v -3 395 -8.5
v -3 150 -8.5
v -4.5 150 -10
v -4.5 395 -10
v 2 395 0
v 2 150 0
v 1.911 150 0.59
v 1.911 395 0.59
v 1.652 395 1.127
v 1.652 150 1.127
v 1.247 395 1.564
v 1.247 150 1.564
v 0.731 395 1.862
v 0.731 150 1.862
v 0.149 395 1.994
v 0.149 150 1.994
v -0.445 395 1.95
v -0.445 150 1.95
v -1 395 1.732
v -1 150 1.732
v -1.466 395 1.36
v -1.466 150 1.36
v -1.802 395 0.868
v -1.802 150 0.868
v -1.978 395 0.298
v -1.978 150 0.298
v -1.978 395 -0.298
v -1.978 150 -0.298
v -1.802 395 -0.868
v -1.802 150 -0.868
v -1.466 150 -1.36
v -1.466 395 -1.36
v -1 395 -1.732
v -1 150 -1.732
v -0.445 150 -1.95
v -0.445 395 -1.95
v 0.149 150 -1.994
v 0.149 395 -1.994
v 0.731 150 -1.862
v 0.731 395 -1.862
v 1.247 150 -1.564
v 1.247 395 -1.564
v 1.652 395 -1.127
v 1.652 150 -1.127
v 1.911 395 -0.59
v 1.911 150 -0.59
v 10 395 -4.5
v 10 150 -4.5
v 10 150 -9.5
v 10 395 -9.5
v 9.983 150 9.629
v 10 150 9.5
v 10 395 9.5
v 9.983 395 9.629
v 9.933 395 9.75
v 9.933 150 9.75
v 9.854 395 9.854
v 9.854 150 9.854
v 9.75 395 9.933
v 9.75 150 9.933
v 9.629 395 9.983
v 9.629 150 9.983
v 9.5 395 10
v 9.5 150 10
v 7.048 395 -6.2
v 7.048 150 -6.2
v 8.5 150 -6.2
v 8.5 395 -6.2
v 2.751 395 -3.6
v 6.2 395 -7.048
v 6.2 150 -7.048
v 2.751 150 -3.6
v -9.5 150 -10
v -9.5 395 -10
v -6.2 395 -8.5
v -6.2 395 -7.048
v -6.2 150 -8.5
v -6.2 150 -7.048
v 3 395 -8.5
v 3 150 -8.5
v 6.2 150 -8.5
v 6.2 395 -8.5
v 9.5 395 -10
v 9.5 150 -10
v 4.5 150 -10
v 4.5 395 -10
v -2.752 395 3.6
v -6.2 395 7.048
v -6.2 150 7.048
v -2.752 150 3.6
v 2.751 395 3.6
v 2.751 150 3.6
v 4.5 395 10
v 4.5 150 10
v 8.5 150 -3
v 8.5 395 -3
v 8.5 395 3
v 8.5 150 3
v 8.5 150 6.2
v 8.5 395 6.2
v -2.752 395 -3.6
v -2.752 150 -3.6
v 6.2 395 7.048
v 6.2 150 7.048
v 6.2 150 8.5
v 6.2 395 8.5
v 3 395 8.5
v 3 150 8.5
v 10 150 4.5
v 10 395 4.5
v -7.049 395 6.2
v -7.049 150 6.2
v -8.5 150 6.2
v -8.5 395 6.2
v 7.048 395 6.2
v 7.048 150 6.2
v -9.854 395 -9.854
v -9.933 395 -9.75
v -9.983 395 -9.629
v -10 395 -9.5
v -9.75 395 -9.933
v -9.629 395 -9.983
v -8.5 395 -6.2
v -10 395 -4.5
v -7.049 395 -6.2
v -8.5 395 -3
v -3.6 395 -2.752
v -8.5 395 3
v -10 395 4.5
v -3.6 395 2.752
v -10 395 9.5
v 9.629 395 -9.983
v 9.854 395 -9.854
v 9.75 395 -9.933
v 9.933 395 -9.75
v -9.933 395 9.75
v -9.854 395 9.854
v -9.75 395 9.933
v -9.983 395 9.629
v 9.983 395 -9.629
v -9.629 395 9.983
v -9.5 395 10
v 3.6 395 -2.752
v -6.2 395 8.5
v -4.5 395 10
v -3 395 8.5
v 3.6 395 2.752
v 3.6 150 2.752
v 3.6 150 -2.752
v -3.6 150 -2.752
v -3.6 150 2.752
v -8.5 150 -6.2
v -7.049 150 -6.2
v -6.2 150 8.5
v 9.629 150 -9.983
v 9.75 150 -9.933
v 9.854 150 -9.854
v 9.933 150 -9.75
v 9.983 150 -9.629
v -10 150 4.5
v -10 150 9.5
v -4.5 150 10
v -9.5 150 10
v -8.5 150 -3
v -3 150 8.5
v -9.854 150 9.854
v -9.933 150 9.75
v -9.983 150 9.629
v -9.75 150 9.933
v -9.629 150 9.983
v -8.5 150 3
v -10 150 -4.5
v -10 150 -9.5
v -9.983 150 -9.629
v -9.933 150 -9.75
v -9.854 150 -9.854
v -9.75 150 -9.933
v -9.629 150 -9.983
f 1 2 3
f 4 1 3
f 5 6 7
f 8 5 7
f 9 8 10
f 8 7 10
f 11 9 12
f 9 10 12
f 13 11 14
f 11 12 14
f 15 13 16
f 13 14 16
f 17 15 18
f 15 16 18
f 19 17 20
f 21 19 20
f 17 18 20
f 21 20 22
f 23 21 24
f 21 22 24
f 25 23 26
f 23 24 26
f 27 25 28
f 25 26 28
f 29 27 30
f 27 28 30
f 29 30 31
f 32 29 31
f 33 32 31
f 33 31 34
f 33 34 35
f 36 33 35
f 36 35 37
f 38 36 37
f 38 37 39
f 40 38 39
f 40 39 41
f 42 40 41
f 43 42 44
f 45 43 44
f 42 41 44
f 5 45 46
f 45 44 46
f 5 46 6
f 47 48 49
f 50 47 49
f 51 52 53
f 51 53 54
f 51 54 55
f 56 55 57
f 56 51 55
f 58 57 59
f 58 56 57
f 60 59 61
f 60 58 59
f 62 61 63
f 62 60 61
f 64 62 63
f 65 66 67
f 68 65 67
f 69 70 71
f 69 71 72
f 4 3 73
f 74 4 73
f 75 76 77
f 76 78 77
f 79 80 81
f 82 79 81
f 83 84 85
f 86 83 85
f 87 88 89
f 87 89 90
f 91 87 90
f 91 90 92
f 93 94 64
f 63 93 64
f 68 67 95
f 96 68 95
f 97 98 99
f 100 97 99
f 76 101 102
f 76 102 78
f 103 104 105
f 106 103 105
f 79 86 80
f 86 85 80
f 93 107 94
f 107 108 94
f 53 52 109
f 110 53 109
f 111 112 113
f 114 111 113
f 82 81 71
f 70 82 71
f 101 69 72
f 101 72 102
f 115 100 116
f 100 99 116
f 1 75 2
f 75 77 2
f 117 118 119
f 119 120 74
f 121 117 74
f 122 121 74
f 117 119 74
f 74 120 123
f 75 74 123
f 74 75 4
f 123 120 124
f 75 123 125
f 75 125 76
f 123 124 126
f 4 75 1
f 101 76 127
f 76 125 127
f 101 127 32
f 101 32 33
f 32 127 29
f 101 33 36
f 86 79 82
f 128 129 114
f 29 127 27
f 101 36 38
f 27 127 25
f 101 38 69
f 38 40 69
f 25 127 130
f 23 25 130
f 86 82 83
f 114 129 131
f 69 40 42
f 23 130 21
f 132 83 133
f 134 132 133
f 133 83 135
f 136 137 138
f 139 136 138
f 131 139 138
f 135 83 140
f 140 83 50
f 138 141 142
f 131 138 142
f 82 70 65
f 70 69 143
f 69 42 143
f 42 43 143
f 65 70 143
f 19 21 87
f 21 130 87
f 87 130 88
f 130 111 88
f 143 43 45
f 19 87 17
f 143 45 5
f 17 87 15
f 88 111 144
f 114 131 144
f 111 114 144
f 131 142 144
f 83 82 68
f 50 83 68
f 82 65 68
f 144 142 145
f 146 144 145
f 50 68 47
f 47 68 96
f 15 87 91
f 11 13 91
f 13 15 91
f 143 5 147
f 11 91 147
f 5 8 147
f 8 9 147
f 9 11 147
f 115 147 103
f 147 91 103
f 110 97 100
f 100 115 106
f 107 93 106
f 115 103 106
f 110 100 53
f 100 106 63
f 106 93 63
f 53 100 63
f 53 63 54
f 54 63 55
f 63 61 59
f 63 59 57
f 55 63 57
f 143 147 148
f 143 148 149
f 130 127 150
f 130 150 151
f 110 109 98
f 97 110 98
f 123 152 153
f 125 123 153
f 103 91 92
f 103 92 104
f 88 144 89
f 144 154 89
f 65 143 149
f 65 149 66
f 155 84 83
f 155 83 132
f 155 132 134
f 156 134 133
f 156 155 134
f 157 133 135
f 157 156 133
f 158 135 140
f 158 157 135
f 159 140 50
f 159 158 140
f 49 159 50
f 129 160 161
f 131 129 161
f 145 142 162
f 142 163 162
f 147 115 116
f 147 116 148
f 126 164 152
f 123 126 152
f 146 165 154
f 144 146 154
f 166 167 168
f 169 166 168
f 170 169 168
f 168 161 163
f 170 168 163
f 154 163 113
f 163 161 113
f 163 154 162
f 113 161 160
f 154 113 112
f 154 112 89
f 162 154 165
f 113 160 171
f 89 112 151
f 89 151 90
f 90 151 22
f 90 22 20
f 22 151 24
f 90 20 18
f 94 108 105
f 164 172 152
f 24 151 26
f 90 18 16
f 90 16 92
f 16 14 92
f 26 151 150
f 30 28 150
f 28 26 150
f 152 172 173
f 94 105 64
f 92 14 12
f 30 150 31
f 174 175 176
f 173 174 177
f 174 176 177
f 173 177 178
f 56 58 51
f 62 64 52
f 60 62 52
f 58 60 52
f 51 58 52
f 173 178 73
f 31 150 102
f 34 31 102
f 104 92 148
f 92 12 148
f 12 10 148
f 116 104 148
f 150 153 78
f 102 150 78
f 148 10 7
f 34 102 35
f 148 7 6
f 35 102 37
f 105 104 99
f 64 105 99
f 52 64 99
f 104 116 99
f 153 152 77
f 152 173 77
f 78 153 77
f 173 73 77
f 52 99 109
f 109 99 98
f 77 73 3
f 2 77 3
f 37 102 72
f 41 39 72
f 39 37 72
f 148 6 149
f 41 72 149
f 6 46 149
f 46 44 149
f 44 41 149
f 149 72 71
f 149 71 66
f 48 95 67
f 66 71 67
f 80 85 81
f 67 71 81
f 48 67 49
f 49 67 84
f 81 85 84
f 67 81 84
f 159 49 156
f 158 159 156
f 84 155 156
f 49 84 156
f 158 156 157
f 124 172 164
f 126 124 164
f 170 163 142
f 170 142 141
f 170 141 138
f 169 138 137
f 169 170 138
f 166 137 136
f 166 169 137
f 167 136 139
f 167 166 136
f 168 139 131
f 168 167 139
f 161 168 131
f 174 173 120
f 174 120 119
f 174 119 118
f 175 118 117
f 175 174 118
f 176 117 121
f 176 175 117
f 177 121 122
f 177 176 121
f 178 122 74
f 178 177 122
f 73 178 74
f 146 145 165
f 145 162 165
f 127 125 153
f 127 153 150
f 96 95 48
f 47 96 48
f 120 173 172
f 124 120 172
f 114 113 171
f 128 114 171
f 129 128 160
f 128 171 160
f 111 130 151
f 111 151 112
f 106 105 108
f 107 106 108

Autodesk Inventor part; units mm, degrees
ref_plane "YZ Plane" through (0, 0, 0) normal (1, 0, 0) x (0, 1, 0)
ref_plane "XZ Plane" through (0, 0, 0) normal (0, 1, 0) x (-1, 0, 0)
ref_plane "Work Plane1" through (-2.7515, 150, 3.6) normal (0, 1, 0) x (1, 0, 0)
sketch "Sketch1" plane through (-2.7515, 150, 3.6) normal (0, 1, 0) x (1, 0, 0)
  arc A0 (-6.7485, 13.6) -> (-7.2485, 13.1) centre (-6.7485, 13.1) ccw projected
  line L0 (-7.2485, 13.1) -> (-7.2485, 8.1) projected
  line L1 (-7.2485, 8.1) -> (-5.7485, 6.6) projected
  line L2 (-5.7485, 6.6) -> (-5.7485, 9.8) projected
  line L3 (-5.7485, 9.8) -> (-4.2971, 9.8) projected
  line L4 (-4.2971, 9.8) -> (-0.8485, 6.3515) projected
  line L5 (-0.8485, 6.3515) -> (-0.8485, 0.8485) projected
  line L6 (-0.8485, 0.8485) -> (-4.2971, -2.6) projected
  line L7 (-4.2971, -2.6) -> (-5.7485, -2.6) projected
  line L8 (-5.7485, -2.6) -> (-5.7485, 0.6) projected
  line L9 (-5.7485, 0.6) -> (-7.2485, -0.9) projected
  line L10 (-7.2485, -0.9) -> (-7.2485, -5.9) projected
  arc A1 (-7.2485, -5.9) -> (-6.7485, -6.4) centre (-6.7485, -5.9) ccw projected
  line L11 (-6.7485, -6.4) -> (-1.7485, -6.4) projected
  line L12 (-1.7485, -6.4) -> (-0.2485, -4.9) projected
  line L13 (-0.2485, -4.9) -> (-3.4485, -4.9) projected
  line L14 (-3.4485, -4.9) -> (-3.4485, -3.4485) projected
  line L15 (-3.4485, -3.4485) -> (0, 0) projected
  line L16 (0, 0) -> (5.5029, 0) projected
  line L17 (5.5029, 0) -> (8.9515, -3.4485) projected
  line L18 (8.9515, -3.4485) -> (8.9515, -4.9) projected
  line L19 (8.9515, -4.9) -> (5.7515, -4.9) projected
  line L20 (5.7515, -4.9) -> (7.2515, -6.4) projected
  line L21 (7.2515, -6.4) -> (12.2515, -6.4) projected
  arc A2 (12.2515, -6.4) -> (12.7515, -5.9) centre (12.2515, -5.9) ccw projected
  line L22 (12.7515, -5.9) -> (12.7515, -0.9) projected
  line L23 (12.7515, -0.9) -> (11.2515, 0.6) projected
  line L24 (11.2515, 0.6) -> (11.2515, -2.6) projected
  line L25 (11.2515, -2.6) -> (9.8, -2.6) projected
  line L26 (9.8, -2.6) -> (6.3515, 0.8485) projected
  line L27 (6.3515, 0.8485) -> (6.3515, 6.3515) projected
  line L28 (6.3515, 6.3515) -> (9.8, 9.8) projected
  line L29 (9.8, 9.8) -> (11.2515, 9.8) projected
  line L30 (11.2515, 9.8) -> (11.2515, 6.6) projected
  line L31 (11.2515, 6.6) -> (12.7515, 8.1) projected
  line L32 (12.7515, 8.1) -> (12.7515, 13.1) projected
  arc A3 (12.7515, 13.1) -> (12.2515, 13.6) centre (12.2515, 13.1) ccw projected
  line L33 (12.2515, 13.6) -> (7.2515, 13.6) projected
  line L34 (7.2515, 13.6) -> (5.7515, 12.1) projected
  line L35 (5.7515, 12.1) -> (8.9515, 12.1) projected
  line L36 (8.9515, 12.1) -> (8.9515, 10.6485) projected
  line L37 (8.9515, 10.6485) -> (5.5029, 7.2) projected
  line L38 (5.5029, 7.2) -> (0, 7.2) projected
  line L39 (0, 7.2) -> (-3.4485, 10.6485) projected
  line L40 (-3.4485, 10.6485) -> (-3.4485, 12.1) projected
  line L41 (-3.4485, 12.1) -> (-0.2485, 12.1) projected
  line L42 (-0.2485, 12.1) -> (-1.7485, 13.6) projected
  line L43 (-1.7485, 13.6) -> (-6.7485, 13.6) projected
  circle A4 centre (2.7515, 3.6) radius 2 projected
extrude "Extrusion1" add sketch "Sketch1" along normal blind 1000
ref_plane "Work Plane2" through (0, 150, -9.5) normal (1, 0, 0) x (0, 0, -1)
ref_plane "Work Plane3" through (-4.5, 150, 0) normal (0, 0, 1) x (1, 0, 0)
ref_plane "Work Plane4" through (-2.7515, 1050, 3.6) normal (0, 1, 0) x (1, 0, 0)
ref_plane "Work Plane5" through (-2.7515, 250, 3.6) normal (0, -1, 0) x (1, 0, 0)
ref_plane "Work Plane6" through (-2.7515, 395, 3.6) normal (0, -1, 0) x (1, 0, 0)
sketch "Sketch2" plane through (-2.7515, 395, 3.6) normal (0, -1, 0) x (1, 0, 0)
  line L0 (-8.2636, 7.3901) -> (13.7161, 7.3901)
  line L1 (13.7161, 7.3901) -> (13.7161, -14.5025)
  line L2 (13.7161, -14.5025) -> (-8.2636, -14.5025)
  line L3 (-8.2636, -14.5025) -> (-8.2636, 7.3901)
  point P0 (2.7515, -3.6)
extrude "Extrusion2" cut sketch "Sketch2" against normal blind 1000
properties part number "20x20mmx150mm alminum profile" material "Aluminum 6061"
